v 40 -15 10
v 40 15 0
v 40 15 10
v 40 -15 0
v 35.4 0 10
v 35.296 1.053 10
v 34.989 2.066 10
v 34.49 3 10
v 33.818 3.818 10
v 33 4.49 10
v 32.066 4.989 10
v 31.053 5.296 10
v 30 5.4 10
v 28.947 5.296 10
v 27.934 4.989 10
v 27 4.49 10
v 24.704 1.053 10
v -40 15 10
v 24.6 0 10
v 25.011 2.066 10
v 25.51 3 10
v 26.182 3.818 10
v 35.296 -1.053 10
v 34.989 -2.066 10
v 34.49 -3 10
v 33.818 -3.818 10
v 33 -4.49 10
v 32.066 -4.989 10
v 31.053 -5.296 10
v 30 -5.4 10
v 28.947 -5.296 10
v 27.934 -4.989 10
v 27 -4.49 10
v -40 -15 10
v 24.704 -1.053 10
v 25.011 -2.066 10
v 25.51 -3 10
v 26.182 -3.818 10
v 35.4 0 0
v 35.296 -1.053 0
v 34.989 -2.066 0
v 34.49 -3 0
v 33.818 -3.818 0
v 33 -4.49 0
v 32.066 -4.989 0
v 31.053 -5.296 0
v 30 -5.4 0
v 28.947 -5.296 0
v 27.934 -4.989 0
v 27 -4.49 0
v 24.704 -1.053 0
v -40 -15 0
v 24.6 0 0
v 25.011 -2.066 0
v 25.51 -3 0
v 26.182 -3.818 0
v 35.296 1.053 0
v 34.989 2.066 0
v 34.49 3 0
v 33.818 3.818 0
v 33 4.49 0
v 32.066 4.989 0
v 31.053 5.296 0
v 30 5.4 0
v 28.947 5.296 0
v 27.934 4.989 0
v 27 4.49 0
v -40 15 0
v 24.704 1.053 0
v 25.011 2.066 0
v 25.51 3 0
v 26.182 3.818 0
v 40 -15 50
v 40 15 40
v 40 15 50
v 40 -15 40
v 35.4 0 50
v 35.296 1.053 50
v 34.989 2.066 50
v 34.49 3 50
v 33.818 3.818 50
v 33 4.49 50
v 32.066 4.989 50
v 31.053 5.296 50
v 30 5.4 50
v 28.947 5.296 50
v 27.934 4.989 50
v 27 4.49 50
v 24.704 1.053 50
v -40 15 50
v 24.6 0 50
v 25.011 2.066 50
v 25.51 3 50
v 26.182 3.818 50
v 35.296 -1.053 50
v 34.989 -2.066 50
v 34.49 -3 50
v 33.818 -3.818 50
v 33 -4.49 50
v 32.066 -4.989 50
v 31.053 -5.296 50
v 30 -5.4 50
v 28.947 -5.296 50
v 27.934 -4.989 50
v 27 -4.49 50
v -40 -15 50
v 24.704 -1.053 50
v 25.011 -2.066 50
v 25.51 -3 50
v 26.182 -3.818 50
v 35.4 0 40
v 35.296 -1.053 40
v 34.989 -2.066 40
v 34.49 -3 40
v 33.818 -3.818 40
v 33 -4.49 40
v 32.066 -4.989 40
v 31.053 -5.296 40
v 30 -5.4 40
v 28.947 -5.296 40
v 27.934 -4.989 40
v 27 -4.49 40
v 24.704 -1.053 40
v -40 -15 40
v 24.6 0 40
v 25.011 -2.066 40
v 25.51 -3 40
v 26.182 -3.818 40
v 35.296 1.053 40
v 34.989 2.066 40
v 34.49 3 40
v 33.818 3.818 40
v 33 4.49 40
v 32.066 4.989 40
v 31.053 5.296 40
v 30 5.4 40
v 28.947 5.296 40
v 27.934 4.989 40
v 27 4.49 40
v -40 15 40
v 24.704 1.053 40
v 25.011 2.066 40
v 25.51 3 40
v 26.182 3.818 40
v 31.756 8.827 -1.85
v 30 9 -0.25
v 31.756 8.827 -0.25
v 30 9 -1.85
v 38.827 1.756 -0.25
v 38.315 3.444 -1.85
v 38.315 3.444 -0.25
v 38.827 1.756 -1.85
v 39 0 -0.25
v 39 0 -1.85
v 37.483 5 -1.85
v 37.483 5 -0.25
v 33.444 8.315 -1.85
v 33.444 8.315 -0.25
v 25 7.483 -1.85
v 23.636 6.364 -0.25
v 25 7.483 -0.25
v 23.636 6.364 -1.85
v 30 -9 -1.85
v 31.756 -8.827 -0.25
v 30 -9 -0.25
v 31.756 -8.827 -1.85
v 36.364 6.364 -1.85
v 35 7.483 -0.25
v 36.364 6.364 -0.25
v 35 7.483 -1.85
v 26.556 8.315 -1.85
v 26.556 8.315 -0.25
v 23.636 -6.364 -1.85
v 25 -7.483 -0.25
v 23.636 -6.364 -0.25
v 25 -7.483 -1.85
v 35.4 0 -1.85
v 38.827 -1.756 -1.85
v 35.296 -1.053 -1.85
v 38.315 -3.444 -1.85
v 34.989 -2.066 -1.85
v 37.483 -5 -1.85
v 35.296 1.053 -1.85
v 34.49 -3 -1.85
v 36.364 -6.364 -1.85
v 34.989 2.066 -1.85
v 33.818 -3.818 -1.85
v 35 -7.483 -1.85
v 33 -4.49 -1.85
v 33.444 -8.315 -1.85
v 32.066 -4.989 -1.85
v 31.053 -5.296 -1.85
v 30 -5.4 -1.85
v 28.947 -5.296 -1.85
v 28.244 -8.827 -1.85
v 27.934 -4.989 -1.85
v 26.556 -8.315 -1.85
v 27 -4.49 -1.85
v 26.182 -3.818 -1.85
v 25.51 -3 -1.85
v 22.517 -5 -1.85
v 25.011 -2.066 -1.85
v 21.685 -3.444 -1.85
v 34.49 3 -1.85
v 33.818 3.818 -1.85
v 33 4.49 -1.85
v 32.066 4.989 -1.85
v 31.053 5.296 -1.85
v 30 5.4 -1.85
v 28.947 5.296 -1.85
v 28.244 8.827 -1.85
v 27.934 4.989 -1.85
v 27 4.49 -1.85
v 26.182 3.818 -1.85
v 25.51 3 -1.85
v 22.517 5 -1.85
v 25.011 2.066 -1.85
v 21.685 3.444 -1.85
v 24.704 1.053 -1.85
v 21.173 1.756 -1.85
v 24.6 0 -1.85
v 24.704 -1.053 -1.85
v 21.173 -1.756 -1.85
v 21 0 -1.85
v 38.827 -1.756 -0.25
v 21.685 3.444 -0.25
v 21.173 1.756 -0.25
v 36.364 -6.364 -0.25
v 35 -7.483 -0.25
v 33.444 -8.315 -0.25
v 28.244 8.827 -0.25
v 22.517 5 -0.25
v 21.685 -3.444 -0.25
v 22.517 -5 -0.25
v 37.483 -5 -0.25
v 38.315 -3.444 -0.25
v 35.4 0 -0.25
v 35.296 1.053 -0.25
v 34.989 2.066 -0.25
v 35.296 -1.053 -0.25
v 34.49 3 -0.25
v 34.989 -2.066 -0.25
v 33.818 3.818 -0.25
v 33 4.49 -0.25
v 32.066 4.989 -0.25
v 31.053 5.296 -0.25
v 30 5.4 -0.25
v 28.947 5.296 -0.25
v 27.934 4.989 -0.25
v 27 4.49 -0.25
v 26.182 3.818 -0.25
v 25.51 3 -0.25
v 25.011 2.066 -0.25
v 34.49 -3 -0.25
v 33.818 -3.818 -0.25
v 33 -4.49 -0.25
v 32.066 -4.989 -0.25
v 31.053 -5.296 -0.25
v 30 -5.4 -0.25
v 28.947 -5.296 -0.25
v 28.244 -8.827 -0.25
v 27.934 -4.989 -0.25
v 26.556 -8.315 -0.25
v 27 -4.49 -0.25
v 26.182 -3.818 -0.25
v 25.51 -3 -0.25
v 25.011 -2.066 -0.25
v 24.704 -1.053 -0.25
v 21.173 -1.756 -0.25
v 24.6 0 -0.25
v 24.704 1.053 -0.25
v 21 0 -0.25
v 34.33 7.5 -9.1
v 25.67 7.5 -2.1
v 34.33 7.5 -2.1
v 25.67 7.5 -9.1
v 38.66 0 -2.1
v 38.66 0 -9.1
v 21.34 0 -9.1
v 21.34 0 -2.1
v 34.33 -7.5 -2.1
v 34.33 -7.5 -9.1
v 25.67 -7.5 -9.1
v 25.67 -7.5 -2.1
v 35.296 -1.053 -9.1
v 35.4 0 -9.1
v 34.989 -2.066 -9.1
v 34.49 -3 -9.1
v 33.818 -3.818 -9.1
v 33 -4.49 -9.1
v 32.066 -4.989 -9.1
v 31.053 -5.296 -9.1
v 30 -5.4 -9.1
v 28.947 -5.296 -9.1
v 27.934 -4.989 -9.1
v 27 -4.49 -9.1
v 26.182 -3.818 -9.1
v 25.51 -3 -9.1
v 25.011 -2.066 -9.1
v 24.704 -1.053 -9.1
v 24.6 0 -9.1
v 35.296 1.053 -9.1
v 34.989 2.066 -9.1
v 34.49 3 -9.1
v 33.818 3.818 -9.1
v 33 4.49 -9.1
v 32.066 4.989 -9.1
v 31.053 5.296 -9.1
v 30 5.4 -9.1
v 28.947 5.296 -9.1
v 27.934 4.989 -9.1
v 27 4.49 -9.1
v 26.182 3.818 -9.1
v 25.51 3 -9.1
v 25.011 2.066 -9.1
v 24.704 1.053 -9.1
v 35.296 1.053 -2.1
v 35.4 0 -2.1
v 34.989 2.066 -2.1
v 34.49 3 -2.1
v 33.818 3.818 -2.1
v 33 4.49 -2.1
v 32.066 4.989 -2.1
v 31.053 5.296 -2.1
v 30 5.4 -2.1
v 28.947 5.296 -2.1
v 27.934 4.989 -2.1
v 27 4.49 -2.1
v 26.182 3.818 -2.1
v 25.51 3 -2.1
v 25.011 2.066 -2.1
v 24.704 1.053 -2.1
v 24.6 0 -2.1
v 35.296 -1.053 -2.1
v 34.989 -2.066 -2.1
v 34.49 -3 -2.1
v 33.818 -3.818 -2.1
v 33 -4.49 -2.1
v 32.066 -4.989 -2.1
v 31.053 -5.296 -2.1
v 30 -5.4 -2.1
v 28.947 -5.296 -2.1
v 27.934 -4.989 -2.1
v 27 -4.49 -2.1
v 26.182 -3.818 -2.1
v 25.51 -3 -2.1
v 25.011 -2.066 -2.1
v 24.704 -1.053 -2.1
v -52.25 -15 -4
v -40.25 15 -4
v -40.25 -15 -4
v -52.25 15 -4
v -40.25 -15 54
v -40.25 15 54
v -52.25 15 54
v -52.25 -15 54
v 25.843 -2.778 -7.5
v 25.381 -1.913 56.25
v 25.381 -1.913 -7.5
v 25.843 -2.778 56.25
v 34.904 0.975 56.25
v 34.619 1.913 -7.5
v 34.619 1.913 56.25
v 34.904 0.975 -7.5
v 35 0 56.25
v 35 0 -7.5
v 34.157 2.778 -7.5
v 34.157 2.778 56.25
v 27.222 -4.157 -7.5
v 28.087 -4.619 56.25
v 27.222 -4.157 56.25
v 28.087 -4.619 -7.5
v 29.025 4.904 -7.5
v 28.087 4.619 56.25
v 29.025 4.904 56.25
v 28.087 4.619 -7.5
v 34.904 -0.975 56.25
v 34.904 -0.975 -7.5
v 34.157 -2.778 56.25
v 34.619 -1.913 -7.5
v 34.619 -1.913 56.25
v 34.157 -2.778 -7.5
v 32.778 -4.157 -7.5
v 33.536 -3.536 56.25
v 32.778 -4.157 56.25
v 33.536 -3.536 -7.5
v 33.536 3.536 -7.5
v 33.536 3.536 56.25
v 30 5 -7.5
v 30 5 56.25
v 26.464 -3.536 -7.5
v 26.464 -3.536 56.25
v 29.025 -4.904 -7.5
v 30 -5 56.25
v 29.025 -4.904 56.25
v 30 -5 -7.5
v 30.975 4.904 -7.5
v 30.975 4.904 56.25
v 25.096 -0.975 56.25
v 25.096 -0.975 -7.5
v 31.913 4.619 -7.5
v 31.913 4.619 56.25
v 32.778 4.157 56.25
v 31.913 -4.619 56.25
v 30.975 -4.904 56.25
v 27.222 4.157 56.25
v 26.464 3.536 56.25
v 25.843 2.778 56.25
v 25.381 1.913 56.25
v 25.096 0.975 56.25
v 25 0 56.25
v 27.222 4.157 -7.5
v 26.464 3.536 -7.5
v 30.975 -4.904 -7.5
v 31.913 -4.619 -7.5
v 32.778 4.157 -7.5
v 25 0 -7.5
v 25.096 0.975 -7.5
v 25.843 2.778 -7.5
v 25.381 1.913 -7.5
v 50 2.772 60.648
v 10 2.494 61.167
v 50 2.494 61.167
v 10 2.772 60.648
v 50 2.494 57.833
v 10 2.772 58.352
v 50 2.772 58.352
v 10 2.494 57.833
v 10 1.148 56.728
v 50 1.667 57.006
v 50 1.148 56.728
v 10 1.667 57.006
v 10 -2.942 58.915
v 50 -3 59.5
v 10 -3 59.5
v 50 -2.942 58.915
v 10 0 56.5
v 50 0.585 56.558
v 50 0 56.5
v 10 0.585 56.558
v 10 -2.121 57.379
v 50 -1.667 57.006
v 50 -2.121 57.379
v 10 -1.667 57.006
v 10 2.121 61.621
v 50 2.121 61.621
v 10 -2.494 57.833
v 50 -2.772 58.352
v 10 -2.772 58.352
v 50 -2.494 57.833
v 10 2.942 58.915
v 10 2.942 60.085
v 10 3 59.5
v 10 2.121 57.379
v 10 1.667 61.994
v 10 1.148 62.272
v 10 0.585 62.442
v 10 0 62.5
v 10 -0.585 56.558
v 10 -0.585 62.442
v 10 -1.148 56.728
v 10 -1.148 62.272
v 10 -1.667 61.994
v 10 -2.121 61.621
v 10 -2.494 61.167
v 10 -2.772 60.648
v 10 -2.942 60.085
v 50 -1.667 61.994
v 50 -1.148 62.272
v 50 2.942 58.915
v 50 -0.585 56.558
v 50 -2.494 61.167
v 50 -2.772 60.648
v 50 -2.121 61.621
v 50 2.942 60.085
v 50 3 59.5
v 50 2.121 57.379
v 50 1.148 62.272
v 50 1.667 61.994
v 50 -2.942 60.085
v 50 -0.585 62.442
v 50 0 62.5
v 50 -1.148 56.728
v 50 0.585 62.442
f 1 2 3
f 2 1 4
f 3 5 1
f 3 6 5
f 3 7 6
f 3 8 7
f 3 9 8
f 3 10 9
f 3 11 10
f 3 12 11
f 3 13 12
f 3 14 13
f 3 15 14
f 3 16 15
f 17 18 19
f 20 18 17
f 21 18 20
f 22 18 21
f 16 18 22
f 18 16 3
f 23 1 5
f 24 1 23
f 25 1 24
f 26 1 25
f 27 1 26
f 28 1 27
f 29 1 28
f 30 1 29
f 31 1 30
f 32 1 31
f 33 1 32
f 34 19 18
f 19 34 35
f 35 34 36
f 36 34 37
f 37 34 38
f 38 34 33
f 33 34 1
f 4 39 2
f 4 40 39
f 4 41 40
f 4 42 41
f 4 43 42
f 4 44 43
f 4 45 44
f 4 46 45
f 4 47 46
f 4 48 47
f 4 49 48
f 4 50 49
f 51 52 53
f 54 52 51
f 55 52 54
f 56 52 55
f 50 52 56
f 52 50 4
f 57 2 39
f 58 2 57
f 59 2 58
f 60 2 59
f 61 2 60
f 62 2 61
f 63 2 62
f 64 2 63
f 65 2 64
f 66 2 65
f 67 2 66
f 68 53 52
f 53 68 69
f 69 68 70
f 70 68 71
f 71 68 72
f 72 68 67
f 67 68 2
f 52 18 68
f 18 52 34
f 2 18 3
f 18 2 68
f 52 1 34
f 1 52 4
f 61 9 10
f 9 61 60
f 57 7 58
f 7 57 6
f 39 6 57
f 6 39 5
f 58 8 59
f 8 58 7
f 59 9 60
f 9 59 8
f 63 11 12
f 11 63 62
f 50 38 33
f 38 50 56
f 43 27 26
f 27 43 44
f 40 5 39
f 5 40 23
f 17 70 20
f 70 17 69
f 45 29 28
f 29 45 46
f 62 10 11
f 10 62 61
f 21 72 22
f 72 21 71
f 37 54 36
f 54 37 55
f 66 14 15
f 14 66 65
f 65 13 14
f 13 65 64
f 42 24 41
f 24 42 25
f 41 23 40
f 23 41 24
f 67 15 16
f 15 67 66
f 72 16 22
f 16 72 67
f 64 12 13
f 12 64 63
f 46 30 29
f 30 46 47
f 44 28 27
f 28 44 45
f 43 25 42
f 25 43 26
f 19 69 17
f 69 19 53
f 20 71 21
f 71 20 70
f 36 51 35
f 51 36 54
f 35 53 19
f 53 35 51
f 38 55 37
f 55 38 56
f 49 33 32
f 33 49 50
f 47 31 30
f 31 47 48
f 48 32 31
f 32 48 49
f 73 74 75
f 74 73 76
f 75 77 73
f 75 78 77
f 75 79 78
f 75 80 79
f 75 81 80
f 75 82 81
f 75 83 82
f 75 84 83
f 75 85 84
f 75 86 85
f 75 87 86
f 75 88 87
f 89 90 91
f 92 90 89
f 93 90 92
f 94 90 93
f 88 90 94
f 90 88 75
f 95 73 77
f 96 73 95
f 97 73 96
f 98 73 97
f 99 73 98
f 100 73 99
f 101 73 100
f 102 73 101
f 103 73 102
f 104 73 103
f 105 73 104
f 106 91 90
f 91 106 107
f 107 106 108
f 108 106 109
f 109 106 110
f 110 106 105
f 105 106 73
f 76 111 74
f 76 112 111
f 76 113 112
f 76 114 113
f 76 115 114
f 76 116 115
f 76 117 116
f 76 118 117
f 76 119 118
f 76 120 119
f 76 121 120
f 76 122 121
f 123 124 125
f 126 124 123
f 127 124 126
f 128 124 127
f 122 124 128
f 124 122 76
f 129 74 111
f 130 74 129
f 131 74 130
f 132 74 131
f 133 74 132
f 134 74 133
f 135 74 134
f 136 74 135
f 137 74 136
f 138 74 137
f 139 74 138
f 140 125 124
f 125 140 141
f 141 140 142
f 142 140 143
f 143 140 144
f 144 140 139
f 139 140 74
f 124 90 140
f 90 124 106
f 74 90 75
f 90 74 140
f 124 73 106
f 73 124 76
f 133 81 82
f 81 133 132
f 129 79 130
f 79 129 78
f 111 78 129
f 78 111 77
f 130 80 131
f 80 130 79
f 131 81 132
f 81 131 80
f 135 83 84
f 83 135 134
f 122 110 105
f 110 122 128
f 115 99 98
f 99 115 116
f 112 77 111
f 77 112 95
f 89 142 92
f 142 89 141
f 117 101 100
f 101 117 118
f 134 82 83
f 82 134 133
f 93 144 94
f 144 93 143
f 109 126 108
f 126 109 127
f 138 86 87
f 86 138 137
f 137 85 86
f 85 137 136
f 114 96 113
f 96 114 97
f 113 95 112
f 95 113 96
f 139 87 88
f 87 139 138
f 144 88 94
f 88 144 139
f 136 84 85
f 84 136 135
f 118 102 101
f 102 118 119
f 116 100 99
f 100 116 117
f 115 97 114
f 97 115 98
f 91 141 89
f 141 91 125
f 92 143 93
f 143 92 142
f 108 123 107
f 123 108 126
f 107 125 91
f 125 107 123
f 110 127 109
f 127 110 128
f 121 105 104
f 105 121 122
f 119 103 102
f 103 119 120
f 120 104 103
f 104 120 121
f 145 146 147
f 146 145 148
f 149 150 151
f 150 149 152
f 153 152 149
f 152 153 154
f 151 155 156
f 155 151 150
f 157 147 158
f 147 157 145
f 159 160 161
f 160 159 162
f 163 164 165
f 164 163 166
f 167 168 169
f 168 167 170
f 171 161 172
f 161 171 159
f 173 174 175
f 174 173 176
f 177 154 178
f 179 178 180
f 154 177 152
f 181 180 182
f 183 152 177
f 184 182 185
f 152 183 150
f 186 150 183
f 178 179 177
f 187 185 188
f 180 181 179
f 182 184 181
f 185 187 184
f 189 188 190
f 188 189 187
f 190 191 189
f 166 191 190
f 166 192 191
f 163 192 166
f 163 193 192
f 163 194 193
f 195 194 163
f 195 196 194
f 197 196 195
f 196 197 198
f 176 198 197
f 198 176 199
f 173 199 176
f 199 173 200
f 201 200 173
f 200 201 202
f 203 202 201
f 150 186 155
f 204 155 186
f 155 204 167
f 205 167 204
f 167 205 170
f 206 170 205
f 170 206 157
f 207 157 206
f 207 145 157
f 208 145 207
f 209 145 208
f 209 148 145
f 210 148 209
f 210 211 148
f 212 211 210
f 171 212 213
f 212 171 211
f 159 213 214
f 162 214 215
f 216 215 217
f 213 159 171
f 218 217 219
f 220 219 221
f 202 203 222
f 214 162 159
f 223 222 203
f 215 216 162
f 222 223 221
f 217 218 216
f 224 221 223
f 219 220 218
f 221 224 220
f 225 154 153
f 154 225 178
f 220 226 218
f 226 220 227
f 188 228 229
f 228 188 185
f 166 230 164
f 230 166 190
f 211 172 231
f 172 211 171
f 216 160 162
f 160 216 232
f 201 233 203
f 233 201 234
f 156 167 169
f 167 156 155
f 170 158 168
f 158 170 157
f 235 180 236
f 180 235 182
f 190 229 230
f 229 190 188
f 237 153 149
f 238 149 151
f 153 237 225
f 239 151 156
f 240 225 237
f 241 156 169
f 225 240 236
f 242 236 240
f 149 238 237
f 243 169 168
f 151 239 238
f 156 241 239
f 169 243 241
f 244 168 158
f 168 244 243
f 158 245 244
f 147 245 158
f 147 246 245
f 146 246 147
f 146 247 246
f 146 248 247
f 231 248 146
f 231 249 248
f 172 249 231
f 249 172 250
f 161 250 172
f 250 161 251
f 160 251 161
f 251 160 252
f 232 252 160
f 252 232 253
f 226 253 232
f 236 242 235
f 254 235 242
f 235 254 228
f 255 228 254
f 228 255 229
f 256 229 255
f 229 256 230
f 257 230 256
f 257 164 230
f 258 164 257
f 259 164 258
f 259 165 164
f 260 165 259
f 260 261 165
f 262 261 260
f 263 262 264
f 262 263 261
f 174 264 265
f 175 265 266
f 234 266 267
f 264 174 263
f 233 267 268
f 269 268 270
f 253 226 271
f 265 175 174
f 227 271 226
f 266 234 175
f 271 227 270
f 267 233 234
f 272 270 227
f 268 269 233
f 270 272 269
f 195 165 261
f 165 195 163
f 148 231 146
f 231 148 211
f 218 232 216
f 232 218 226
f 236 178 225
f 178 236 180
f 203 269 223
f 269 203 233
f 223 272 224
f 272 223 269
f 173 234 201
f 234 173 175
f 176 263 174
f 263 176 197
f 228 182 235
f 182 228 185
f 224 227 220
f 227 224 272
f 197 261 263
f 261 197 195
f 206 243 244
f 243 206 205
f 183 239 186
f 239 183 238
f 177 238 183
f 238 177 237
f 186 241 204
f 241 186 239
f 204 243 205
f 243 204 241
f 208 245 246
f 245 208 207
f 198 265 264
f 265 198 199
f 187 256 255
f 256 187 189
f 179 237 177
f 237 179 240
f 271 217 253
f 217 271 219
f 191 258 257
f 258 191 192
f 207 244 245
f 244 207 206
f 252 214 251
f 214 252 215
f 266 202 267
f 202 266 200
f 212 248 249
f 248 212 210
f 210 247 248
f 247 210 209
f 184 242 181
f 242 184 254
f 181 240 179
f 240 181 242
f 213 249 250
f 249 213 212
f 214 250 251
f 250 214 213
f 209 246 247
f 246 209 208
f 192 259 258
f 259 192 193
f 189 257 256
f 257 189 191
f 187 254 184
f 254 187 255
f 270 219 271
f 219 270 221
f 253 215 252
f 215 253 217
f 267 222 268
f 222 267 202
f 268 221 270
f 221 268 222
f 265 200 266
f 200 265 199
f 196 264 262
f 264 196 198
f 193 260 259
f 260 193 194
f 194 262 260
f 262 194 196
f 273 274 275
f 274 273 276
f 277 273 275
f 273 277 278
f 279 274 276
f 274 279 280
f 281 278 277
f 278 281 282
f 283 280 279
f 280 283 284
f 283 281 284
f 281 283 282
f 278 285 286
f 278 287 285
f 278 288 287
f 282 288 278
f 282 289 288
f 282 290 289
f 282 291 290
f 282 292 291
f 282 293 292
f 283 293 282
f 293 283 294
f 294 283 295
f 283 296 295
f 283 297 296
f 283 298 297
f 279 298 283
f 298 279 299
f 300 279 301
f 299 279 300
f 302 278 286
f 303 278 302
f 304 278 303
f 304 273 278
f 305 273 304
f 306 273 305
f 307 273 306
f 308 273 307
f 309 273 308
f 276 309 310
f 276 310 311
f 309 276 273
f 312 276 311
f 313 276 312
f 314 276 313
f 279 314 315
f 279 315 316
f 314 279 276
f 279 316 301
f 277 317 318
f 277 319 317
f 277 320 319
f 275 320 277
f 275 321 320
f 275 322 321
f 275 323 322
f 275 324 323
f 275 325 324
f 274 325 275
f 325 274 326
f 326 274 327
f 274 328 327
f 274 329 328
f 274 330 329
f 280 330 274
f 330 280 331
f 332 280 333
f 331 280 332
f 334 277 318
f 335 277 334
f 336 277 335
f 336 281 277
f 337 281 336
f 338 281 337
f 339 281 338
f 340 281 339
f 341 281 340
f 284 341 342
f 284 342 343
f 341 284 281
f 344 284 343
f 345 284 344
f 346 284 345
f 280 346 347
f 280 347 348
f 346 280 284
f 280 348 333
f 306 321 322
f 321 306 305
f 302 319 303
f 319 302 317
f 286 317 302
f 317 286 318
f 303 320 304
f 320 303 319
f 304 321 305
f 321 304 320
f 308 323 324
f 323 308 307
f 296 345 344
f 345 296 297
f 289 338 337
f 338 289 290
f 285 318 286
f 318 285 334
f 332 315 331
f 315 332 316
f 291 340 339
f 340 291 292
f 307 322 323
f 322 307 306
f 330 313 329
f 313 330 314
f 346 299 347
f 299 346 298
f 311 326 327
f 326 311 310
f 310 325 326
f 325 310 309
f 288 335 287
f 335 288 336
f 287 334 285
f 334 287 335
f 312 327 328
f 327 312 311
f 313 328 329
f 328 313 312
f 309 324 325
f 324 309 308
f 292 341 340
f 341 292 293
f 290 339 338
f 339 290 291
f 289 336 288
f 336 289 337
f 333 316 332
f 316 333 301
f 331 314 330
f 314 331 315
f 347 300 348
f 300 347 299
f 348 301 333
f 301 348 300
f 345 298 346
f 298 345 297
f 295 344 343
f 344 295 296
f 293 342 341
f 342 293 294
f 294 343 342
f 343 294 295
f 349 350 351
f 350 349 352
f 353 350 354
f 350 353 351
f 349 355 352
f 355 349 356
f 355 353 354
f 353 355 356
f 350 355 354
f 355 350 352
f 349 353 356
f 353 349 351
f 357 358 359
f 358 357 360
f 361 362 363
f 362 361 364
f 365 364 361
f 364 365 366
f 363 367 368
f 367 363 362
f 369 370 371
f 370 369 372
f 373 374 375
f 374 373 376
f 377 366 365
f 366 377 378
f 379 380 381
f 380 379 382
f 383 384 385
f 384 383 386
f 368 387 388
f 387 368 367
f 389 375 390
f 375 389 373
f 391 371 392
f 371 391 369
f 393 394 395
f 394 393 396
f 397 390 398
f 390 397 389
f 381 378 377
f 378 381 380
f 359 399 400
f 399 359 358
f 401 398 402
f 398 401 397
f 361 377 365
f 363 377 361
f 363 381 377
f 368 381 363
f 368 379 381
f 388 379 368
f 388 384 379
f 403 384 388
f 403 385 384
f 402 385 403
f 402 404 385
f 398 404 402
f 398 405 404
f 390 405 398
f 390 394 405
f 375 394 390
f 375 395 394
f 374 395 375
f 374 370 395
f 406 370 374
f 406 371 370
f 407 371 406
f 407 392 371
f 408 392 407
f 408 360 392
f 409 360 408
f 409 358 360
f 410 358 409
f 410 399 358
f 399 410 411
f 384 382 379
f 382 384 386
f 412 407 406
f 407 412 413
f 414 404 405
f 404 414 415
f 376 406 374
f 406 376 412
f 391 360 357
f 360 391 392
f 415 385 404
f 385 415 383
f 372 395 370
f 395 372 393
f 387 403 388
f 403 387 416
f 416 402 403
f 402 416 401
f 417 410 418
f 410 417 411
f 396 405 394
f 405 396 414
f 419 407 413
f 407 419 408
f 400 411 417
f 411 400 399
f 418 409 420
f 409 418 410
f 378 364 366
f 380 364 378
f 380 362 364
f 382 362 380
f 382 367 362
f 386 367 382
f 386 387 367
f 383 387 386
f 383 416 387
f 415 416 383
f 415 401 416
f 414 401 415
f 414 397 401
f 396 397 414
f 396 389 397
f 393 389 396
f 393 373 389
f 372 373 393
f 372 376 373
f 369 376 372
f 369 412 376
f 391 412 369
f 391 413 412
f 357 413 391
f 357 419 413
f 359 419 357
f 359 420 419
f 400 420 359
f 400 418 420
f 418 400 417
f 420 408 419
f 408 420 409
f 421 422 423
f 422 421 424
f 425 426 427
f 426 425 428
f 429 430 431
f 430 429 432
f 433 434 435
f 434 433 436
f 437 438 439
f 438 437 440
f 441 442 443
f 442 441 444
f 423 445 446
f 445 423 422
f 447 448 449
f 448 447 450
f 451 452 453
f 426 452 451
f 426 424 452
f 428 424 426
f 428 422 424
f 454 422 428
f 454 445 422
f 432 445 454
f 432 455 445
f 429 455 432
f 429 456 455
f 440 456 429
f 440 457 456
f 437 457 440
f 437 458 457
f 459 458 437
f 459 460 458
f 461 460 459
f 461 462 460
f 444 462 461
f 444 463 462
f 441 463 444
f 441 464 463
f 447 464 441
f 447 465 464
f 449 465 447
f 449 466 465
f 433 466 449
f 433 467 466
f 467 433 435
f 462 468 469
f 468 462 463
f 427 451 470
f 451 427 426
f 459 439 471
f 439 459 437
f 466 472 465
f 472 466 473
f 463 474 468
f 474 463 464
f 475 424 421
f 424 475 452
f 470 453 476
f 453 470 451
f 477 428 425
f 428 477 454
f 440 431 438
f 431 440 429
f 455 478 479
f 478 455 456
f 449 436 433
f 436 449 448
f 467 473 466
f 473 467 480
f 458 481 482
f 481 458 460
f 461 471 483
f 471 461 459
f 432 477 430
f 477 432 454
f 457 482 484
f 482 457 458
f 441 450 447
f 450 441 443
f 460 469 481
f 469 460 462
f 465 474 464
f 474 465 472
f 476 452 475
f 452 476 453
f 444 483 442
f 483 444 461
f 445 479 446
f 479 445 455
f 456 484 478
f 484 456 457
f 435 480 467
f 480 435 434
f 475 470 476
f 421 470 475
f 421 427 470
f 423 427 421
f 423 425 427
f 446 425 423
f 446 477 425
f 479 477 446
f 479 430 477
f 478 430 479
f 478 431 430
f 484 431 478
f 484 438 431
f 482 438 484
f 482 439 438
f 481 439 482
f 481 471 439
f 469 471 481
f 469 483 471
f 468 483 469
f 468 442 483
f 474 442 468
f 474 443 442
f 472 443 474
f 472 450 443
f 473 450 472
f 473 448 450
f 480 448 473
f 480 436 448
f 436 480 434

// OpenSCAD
$fn = 32;

// ------------------------------------------------------------------------
// C clamp: throat 40 mm, screw d10
// Every part is its own module, assembly() places every instance.
// ------------------------------------------------------------------------

// --- part 1 ---
module clamp_arm() {
  difference() {
    translate([-40, -15, 0]) cube([80, 30, 10]);
    translate([30, 0, -1]) cylinder(h = 12, d = 10.8);
  }
}

// --- part 2 ---
module clamp_spine() {
  difference() {
    translate([-29, -15, 0]) cube([58, 30, 12]);
  }
}

// --- part 3 ---
module clamp_screw() {
  translate([0, 0, -31.875]) cylinder(h = 63.75, d = 10);
}

// --- part 4 ---
module clamp_washer() {
  difference() {
      translate([0, 0, 0]) cylinder(h = 1.6, d = 18);
      translate([0, 0, -1]) cylinder(h = 3.6, d = 10.8);
    }
}

// --- part 5 ---
module clamp_nut() {
  difference() {
    linear_extrude(height = 7) polygon(points = [[8.66, 0], [4.33, 7.5], [-4.33, 7.5], [-8.66, 0], [-4.33, -7.5], [4.33, -7.5]]);
    translate([0, 0, -1]) cylinder(h = 9, d = 10.8);
  }
}

// --- part 6 ---
module tommy_bar() {
  translate([0, 0, -20]) cylinder(h = 40, d = 6);
}

// --- assembly ---
module assembly() {
  color([0.80, 0.24, 0.20]) translate([0, 0, 0]) rotate([0, 0, 0]) clamp_arm();
  color([0.20, 0.45, 0.75]) translate([0, 0, 40]) rotate([0, 0, 0]) clamp_arm();
  color([0.25, 0.62, 0.32]) translate([-52.25, 0, 25]) rotate([0, 90, 0]) clamp_spine();
  color([0.92, 0.70, 0.18]) translate([30, 0, 24.375]) rotate([0, 0, 0]) clamp_screw();
  color([0.58, 0.35, 0.70]) translate([30, 0, -1.85]) rotate([0, 0, 0]) clamp_washer();
  color([0.16, 0.66, 0.66]) translate([30, 0, -9.1]) rotate([0, 0, 0]) clamp_nut();
  color([0.85, 0.48, 0.18]) translate([30, 0, 59.5]) rotate([0, 90, 0]) tommy_bar();
}

assembly();
